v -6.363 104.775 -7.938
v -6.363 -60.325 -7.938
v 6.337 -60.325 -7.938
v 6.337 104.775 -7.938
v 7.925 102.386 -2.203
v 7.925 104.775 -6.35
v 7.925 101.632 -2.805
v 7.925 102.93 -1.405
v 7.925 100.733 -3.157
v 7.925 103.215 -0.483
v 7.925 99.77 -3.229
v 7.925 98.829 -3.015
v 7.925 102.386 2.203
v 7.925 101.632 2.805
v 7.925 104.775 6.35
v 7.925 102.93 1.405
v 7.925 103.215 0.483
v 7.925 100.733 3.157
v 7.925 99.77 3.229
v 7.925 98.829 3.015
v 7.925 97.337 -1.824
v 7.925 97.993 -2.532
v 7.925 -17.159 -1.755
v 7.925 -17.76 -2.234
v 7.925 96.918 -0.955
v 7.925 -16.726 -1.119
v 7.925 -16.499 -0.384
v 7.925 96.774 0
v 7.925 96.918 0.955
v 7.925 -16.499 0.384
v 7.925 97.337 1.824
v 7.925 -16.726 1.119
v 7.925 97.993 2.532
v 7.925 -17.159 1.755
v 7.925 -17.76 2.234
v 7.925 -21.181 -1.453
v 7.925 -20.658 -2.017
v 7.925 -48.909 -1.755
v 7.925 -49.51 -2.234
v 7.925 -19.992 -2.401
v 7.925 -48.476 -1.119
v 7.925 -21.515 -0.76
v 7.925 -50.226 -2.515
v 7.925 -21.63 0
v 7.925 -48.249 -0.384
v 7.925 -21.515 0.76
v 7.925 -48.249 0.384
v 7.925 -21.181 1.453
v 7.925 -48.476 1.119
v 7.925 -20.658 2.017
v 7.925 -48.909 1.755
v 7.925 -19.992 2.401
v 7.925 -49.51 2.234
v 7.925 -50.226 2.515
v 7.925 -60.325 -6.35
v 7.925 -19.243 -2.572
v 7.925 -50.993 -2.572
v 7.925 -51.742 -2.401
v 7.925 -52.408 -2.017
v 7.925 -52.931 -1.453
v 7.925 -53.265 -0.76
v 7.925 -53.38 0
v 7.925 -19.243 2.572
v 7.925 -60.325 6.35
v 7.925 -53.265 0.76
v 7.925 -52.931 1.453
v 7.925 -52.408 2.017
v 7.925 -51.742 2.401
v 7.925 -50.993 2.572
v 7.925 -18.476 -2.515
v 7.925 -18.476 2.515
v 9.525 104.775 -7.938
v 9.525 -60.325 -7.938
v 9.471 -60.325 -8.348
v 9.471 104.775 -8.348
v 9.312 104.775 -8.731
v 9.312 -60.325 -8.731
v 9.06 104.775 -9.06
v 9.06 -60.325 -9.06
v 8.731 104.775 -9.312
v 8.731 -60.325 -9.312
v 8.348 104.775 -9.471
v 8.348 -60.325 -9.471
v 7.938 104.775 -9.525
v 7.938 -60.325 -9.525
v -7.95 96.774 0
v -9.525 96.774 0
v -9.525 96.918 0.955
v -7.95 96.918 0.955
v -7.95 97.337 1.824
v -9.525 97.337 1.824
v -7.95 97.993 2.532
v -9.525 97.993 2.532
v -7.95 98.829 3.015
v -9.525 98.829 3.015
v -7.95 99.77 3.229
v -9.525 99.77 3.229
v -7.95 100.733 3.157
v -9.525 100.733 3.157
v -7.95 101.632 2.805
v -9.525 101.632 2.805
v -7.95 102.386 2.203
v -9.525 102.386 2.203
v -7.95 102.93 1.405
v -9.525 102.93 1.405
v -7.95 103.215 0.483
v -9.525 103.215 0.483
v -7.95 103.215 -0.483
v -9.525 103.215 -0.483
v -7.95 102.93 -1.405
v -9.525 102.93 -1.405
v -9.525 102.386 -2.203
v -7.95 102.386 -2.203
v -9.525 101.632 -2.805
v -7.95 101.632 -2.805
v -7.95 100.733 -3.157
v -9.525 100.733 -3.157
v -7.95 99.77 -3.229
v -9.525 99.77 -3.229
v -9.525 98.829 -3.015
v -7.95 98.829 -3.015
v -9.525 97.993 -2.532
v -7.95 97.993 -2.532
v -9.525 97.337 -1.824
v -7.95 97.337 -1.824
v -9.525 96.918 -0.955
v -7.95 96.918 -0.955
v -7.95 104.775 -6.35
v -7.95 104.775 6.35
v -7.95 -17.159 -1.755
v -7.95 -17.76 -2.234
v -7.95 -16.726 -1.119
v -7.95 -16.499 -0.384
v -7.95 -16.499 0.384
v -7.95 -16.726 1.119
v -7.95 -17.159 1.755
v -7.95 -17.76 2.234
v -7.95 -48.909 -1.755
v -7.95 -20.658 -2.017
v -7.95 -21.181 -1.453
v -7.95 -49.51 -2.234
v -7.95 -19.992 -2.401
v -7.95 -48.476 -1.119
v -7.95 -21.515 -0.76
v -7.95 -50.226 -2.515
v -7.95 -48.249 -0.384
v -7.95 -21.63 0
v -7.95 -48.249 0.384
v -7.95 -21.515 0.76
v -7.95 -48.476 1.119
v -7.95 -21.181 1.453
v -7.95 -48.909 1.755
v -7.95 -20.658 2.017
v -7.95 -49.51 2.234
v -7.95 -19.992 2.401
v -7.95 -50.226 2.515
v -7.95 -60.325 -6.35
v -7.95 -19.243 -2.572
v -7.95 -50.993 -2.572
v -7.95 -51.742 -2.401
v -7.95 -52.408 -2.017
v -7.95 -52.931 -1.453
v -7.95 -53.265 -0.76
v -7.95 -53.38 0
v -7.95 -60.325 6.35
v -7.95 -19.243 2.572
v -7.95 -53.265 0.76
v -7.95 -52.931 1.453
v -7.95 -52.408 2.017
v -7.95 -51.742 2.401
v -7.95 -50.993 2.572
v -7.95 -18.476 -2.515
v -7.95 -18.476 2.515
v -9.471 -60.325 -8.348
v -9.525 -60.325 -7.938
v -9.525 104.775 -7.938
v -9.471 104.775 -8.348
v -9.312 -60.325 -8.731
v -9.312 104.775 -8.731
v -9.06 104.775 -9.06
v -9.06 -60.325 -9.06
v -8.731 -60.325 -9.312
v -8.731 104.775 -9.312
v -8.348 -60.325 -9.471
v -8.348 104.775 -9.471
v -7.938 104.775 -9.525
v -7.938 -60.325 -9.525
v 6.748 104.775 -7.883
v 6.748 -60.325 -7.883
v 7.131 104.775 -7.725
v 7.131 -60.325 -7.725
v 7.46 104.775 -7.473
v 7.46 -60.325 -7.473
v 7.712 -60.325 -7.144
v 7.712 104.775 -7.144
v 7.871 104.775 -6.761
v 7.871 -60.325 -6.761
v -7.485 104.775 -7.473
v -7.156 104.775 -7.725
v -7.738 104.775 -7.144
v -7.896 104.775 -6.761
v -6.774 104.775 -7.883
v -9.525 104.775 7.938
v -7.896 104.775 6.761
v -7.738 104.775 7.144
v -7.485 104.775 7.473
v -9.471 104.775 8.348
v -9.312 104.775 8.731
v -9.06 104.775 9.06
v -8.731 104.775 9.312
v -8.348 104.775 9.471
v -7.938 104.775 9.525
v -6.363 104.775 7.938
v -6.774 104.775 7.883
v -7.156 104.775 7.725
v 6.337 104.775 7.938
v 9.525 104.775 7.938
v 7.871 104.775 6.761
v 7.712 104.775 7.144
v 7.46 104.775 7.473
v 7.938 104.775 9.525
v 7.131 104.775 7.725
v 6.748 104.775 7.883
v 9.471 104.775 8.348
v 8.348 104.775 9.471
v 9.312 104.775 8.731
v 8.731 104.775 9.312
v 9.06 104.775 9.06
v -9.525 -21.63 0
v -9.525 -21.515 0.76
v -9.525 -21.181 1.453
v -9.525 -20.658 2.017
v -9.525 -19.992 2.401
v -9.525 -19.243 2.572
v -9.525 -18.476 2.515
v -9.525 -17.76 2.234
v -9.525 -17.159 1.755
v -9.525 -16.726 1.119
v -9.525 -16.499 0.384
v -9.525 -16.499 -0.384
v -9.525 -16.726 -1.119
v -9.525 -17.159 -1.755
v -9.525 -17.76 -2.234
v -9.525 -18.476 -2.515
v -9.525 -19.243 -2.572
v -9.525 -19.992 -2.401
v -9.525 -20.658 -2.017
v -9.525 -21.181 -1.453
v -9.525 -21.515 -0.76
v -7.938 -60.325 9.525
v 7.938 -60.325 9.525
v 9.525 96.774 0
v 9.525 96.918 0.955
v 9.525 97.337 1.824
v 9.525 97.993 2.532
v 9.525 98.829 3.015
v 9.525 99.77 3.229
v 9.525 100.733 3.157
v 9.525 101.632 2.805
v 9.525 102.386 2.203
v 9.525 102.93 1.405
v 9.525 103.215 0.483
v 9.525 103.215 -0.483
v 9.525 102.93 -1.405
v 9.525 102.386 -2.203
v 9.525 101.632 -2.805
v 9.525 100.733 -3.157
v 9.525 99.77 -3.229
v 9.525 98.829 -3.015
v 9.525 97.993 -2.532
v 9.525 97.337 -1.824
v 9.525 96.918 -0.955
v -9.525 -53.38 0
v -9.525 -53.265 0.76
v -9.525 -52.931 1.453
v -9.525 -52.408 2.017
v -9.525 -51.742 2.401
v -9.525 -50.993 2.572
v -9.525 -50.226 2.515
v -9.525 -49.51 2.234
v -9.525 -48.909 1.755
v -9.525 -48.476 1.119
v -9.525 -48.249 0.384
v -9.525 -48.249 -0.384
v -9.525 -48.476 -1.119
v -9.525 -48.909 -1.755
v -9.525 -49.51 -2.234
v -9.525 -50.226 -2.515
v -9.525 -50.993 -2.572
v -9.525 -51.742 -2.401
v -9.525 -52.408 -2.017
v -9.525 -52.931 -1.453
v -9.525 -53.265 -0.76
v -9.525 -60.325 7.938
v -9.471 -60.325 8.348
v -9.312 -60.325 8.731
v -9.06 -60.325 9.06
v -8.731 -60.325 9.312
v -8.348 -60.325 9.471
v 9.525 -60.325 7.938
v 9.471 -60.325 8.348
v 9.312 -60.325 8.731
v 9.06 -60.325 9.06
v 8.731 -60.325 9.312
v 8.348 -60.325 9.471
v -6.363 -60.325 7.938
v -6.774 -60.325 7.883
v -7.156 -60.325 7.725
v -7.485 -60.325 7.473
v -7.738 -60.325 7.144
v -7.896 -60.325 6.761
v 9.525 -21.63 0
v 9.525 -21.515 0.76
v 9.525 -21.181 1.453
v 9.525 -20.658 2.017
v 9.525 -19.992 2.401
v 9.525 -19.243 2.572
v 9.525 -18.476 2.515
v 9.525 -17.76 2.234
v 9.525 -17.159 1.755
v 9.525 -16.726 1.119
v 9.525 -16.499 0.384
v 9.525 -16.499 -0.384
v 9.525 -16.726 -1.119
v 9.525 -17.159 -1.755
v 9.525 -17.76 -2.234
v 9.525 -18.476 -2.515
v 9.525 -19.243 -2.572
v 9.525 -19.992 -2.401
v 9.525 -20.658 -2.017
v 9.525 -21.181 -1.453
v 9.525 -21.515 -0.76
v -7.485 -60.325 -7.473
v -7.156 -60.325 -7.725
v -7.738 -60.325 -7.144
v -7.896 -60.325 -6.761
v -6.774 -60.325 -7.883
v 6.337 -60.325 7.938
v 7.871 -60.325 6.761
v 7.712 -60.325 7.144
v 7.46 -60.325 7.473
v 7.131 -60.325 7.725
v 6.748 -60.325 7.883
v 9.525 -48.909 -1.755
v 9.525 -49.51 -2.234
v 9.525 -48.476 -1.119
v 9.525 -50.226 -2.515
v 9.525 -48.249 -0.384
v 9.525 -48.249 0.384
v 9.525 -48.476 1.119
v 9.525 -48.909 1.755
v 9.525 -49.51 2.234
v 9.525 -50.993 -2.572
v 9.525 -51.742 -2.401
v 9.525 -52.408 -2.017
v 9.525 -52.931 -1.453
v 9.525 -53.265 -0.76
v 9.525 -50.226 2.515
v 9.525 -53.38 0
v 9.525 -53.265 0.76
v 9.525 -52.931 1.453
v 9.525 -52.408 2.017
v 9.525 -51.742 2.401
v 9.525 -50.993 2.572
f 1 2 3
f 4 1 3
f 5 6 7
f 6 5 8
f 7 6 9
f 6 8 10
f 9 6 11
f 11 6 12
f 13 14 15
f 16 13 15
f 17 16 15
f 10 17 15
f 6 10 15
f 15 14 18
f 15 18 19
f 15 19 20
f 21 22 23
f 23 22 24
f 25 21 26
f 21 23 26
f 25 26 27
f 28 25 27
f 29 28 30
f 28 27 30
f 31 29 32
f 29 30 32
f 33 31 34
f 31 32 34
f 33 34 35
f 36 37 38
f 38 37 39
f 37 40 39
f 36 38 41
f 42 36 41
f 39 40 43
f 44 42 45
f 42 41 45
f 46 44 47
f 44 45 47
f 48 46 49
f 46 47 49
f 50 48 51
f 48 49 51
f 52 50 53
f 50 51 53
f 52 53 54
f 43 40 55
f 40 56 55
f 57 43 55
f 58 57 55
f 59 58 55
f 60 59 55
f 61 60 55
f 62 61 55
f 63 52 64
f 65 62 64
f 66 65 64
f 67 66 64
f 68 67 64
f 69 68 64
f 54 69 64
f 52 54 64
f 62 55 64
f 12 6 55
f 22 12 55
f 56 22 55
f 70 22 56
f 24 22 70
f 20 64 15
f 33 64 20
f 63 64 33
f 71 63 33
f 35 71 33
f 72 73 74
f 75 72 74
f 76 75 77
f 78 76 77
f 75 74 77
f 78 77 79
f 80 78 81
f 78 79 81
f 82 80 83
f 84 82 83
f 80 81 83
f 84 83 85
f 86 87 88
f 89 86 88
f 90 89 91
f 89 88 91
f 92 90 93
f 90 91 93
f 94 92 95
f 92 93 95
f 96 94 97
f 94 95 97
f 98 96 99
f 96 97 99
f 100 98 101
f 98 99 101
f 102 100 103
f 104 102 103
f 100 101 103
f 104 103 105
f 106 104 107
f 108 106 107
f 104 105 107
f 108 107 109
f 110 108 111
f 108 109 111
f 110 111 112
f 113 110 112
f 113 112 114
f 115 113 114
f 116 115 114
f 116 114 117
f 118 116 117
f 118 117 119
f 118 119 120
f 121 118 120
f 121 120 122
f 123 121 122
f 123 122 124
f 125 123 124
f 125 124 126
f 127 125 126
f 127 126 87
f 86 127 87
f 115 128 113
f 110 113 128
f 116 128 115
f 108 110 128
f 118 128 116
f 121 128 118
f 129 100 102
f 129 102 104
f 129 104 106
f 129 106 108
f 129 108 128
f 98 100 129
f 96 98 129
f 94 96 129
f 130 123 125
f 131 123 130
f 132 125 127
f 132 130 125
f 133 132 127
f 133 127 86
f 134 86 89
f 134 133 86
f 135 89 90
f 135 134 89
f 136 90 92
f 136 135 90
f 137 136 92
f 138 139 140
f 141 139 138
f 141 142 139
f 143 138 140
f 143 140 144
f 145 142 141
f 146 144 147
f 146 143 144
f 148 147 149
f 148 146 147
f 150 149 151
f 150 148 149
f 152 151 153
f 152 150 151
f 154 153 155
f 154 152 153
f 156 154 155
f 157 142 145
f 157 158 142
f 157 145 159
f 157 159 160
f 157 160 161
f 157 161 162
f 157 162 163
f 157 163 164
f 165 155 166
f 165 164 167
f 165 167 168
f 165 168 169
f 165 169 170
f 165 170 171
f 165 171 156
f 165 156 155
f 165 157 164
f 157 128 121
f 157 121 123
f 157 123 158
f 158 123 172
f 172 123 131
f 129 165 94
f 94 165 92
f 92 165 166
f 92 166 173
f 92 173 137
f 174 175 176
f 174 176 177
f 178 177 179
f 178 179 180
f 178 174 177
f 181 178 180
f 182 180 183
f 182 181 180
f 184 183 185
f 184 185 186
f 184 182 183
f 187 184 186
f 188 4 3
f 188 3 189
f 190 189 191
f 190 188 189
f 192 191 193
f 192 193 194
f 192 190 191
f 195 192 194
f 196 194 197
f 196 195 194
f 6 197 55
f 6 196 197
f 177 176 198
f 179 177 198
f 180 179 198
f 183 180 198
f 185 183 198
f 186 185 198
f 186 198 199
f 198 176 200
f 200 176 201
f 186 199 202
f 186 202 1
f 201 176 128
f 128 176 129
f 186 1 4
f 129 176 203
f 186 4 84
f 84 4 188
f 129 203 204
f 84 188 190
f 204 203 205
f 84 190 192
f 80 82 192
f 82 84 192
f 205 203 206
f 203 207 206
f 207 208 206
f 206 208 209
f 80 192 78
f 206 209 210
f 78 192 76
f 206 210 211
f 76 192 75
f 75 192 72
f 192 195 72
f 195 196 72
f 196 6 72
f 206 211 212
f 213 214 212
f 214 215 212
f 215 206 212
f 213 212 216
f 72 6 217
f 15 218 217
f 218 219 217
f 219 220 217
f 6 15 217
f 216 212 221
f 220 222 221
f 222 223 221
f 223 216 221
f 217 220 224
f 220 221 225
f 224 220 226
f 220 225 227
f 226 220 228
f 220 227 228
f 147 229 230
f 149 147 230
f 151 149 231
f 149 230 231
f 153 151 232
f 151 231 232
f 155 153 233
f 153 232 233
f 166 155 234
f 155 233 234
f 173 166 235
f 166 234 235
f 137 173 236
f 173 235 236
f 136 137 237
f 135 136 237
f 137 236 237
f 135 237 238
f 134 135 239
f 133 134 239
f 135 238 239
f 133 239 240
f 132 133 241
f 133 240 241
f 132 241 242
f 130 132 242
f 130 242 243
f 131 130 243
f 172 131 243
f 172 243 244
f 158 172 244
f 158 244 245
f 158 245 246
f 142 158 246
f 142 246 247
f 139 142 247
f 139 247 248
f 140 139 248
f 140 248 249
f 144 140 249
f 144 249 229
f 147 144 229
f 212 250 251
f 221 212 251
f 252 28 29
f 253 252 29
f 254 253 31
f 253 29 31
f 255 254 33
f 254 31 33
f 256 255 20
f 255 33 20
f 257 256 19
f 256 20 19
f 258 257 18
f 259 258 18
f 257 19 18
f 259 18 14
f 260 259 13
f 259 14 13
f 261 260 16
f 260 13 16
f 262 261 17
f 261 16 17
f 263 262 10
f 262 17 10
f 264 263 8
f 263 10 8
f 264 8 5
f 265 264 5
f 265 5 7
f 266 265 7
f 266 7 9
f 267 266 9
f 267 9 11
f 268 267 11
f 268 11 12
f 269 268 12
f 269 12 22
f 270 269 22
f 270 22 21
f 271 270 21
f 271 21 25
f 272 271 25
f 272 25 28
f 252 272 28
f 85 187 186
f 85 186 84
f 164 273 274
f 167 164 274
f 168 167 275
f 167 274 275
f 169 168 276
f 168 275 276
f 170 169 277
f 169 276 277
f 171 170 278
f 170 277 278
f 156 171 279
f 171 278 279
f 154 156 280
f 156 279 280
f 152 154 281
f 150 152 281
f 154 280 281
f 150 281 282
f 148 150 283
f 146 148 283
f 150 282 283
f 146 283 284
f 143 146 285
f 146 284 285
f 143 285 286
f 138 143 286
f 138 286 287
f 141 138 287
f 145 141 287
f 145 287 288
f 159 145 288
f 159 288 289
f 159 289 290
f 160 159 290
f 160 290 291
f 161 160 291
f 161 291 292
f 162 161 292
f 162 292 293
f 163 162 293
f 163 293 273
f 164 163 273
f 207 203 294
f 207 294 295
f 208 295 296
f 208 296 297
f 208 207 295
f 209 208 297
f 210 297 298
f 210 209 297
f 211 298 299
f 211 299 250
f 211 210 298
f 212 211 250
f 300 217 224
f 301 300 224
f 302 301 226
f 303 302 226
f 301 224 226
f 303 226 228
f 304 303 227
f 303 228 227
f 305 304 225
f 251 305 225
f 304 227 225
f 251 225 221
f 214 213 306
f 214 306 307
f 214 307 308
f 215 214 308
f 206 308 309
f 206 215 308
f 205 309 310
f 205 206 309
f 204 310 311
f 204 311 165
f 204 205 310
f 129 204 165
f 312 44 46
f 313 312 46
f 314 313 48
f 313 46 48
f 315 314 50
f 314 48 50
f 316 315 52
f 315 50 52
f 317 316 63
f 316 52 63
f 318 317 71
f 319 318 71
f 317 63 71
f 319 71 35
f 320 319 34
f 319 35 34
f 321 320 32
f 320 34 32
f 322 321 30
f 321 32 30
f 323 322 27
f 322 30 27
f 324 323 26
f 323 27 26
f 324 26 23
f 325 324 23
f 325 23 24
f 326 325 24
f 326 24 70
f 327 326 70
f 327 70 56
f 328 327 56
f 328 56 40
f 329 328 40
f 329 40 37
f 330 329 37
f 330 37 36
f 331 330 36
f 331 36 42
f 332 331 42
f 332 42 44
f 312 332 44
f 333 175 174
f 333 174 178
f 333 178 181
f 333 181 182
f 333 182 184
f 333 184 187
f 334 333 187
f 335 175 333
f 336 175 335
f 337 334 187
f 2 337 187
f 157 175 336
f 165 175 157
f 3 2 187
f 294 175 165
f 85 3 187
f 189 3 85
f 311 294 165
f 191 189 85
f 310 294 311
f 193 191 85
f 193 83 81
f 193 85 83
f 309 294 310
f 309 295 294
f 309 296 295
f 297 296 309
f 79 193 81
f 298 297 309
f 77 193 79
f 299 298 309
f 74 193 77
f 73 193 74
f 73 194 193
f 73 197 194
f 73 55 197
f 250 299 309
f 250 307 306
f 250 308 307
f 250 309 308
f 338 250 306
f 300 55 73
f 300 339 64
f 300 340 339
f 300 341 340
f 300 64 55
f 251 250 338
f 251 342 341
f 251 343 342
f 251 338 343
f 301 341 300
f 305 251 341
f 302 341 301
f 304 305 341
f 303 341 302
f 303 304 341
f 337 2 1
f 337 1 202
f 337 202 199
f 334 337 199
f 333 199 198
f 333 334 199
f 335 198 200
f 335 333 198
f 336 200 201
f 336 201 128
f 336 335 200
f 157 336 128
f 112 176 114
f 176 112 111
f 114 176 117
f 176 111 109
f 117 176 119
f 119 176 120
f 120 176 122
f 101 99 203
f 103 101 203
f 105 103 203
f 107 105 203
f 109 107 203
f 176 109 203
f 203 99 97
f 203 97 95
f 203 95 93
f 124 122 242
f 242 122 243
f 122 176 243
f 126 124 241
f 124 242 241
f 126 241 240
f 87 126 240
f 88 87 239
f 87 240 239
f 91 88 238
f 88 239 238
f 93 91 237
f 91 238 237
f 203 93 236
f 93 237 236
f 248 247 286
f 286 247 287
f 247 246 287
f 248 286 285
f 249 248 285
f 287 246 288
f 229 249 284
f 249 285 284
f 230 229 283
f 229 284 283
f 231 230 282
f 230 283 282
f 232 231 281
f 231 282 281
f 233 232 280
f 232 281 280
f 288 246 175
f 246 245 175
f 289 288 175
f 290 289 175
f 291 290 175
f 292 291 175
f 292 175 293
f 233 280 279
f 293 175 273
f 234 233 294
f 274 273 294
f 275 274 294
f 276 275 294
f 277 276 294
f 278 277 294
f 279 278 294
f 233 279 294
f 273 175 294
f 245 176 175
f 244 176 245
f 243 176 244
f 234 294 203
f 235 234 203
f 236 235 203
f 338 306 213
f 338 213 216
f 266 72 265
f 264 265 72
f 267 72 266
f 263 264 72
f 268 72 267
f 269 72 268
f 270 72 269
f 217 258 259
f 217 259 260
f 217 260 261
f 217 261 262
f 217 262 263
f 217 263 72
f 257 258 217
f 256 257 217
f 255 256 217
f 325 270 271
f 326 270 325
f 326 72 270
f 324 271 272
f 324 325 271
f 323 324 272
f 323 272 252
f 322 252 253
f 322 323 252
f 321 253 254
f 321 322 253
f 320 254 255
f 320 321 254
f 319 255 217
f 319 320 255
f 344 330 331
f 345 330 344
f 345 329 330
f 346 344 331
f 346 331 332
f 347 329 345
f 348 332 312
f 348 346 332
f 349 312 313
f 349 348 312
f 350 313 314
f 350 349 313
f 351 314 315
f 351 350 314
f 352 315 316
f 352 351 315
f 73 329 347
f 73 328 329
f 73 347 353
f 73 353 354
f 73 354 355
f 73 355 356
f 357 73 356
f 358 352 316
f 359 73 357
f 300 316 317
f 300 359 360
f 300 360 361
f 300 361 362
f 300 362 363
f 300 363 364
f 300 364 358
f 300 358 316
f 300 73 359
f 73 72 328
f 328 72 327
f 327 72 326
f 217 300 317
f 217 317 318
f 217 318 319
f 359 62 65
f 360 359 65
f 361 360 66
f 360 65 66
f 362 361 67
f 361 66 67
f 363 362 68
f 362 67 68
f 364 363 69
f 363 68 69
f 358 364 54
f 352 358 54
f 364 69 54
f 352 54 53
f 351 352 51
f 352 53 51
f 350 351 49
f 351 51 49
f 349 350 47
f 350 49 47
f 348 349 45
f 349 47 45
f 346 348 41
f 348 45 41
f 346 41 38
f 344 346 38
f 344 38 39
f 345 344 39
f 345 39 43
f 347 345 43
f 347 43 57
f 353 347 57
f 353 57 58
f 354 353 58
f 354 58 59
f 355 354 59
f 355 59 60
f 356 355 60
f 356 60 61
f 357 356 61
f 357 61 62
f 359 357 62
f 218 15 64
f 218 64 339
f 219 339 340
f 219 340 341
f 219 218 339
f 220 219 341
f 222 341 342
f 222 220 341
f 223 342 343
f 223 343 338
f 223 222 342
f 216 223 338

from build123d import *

# Parameters (mm, degrees)
F0_W     = 19.05
F0_H     = 19.05
F0_W_2   = 15.875
F0_H_2   = 15.875
F1_DEPTH = 107.95
F2_R     = 1.5875
F3_R     = 1.5875
F4_R     = 3.2385
F4_R_2   = 2.5796875
F5_DEPTH = 19.05
F6_DEPTH = 47.625
F7_DEPTH = 3.175


# Not quite as in the source:
# - a length typed as a fraction of an inch, garbled in the dataset ("3 / 203.2 mm" for 3/8 in), is restored


with BuildPart() as f1:
    # F0 (on Front) → F1 (new body, symmetric)
    with BuildSketch(Plane.XZ):
        Rectangle(F0_W, F0_H)
        with Locations((-0.0127, 0)):
            Rectangle(F0_W_2, F0_H_2, mode=Mode.SUBTRACT)
    extrude(amount=F1_DEPTH, both=True)

    # F2
    f2_edges = [f1.edges().sort_by_distance(p)[0] for p in [
        (-9.525, 0, 9.525),
        (-9.525, 0, -9.525),
        (9.525, 0, -9.525),
        (9.525, 0, 9.525),
    ]]
    fillet(f2_edges, radius=F2_R)

    # F3
    f3_edges = [f1.edges().sort_by_distance(p)[0] for p in [
        (-7.9502, 0, 7.9375),
        (-7.9502, 0, -7.9375),
        (7.9248, 0, 7.9375),
        (7.9248, 0, -7.9375),
    ]]
    fillet(f3_edges, radius=F3_R)

    # F4 (on face) → F5 (cut)
    with BuildSketch(Plane(origin=(-9.525, 0, 0), x_dir=(0, -1, 0), z_dir=(-1, 0, 0))):
        with Locations((-100.0125, 0)):
            Circle(F4_R)
        with Locations((19.05, 0)):
            Circle(F4_R_2)
        with Locations((50.8, 0)):
            Circle(F4_R_2)
    extrude(amount=-F5_DEPTH, mode=Mode.SUBTRACT)

    # F6 (cut): a face of the model
    f6_faces = [f1.faces().sort_by_distance(p)[0] for p in [
        (-8.2196076836, -107.95, 0),
    ]]
    extrude(f6_faces, amount=-F6_DEPTH, mode=Mode.SUBTRACT)

    # F7 (cut): a face of the model
    f7_faces = [f1.faces().sort_by_distance(p)[0] for p in [
        (-8.2196076836, 107.95, 0),
    ]]
    extrude(f7_faces, amount=-F7_DEPTH, mode=Mode.SUBTRACT)


solid = f1.part
